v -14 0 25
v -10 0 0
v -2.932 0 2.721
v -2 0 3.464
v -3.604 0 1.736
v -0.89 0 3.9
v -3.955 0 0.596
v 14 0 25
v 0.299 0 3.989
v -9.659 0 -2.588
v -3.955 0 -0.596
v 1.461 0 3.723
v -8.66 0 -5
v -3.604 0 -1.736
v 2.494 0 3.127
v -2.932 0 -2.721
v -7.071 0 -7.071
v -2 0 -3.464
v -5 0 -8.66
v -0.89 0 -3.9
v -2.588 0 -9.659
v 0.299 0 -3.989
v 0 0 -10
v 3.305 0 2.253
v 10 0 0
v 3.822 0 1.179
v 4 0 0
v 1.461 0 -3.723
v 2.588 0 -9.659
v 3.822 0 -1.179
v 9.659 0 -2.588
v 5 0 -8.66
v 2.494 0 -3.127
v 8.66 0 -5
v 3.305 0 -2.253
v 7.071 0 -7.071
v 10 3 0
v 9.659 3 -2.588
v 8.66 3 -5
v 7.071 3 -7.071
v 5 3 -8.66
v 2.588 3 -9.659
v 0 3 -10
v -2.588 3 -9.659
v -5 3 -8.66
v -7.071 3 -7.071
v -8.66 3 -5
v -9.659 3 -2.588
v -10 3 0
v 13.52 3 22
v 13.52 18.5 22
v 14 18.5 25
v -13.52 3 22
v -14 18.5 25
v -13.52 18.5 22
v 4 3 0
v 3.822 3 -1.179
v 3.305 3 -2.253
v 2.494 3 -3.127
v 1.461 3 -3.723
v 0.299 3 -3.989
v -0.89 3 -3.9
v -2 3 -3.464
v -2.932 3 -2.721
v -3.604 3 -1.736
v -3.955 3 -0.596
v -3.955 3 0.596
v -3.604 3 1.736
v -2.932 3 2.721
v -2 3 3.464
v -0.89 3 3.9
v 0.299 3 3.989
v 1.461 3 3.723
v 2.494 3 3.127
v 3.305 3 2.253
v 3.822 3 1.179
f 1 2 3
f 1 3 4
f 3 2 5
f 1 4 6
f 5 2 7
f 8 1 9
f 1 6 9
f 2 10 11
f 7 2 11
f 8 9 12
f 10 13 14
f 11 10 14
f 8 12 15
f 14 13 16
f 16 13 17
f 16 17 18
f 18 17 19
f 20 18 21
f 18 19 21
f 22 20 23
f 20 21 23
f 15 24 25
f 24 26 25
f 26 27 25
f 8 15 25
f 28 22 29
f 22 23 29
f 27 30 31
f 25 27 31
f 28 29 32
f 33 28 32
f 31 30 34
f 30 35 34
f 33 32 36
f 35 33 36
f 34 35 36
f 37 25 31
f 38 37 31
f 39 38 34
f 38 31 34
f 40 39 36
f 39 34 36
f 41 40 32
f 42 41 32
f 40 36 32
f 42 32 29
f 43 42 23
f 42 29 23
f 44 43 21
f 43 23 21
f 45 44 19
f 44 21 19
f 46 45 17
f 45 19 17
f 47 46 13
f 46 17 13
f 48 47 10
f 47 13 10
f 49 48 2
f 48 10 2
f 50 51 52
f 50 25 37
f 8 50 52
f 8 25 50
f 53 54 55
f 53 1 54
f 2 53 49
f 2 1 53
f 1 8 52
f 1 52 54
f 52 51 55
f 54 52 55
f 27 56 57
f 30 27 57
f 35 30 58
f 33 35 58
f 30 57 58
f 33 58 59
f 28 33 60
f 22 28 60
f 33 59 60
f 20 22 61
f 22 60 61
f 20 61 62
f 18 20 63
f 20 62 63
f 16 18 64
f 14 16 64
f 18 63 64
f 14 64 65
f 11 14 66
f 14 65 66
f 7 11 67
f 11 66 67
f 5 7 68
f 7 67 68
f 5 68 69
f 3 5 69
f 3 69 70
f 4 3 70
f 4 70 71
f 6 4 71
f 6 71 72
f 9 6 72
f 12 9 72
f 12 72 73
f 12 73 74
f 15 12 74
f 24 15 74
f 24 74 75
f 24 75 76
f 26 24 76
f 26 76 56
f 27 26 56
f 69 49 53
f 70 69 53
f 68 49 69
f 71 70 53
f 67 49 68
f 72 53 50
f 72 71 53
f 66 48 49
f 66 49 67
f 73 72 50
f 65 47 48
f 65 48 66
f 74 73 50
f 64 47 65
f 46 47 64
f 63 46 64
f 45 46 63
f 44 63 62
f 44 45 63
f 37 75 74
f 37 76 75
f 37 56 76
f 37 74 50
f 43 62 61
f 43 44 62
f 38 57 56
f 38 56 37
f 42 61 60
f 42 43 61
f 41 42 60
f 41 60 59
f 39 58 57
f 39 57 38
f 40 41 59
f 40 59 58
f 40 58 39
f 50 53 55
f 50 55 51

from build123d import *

# Parameters (mm, degrees)
BOSS_EXTRUDE1_DEPTH = 3
SKETCH2_R           = 4
CUT_EXTRUDE1_DEPTH  = 13
BOSS_EXTRUDE2_DEPTH = 15.5


with BuildPart() as part:
    # Sketch1 → Boss-Extrude1 (new body)
    with BuildSketch(Plane(origin=(0, 0, 0), x_dir=(1, 0, 0), z_dir=(0, 1, 0))):
        with BuildLine():
            Line((-10, 0), (-14, -25))
            Line((-14, -25), (14, -25))
            Line((14, -25), (10, 0))
            ThreePointArc((10, 0), (0, 10), (-10, 0))
        make_face()
    extrude(amount=BOSS_EXTRUDE1_DEPTH)

    # Sketch2 → Cut-Extrude1 (cut)
    with BuildSketch(Plane(origin=(0, 3, 0), x_dir=(1, 0, 0), z_dir=(0, 1, 0))):
        Circle(SKETCH2_R)
    extrude(amount=-CUT_EXTRUDE1_DEPTH, mode=Mode.SUBTRACT)

    # Sketch5 → Boss-Extrude2 (add)
    with BuildSketch(Plane(origin=(0, 3, 0), x_dir=(1, 0, 0), z_dir=(0, 1, 0))):
        Polygon((-13.52, -22), (13.52, -22), (14, -25), (-14, -25), align=None)
    extrude(amount=BOSS_EXTRUDE2_DEPTH)


solid = part.part
